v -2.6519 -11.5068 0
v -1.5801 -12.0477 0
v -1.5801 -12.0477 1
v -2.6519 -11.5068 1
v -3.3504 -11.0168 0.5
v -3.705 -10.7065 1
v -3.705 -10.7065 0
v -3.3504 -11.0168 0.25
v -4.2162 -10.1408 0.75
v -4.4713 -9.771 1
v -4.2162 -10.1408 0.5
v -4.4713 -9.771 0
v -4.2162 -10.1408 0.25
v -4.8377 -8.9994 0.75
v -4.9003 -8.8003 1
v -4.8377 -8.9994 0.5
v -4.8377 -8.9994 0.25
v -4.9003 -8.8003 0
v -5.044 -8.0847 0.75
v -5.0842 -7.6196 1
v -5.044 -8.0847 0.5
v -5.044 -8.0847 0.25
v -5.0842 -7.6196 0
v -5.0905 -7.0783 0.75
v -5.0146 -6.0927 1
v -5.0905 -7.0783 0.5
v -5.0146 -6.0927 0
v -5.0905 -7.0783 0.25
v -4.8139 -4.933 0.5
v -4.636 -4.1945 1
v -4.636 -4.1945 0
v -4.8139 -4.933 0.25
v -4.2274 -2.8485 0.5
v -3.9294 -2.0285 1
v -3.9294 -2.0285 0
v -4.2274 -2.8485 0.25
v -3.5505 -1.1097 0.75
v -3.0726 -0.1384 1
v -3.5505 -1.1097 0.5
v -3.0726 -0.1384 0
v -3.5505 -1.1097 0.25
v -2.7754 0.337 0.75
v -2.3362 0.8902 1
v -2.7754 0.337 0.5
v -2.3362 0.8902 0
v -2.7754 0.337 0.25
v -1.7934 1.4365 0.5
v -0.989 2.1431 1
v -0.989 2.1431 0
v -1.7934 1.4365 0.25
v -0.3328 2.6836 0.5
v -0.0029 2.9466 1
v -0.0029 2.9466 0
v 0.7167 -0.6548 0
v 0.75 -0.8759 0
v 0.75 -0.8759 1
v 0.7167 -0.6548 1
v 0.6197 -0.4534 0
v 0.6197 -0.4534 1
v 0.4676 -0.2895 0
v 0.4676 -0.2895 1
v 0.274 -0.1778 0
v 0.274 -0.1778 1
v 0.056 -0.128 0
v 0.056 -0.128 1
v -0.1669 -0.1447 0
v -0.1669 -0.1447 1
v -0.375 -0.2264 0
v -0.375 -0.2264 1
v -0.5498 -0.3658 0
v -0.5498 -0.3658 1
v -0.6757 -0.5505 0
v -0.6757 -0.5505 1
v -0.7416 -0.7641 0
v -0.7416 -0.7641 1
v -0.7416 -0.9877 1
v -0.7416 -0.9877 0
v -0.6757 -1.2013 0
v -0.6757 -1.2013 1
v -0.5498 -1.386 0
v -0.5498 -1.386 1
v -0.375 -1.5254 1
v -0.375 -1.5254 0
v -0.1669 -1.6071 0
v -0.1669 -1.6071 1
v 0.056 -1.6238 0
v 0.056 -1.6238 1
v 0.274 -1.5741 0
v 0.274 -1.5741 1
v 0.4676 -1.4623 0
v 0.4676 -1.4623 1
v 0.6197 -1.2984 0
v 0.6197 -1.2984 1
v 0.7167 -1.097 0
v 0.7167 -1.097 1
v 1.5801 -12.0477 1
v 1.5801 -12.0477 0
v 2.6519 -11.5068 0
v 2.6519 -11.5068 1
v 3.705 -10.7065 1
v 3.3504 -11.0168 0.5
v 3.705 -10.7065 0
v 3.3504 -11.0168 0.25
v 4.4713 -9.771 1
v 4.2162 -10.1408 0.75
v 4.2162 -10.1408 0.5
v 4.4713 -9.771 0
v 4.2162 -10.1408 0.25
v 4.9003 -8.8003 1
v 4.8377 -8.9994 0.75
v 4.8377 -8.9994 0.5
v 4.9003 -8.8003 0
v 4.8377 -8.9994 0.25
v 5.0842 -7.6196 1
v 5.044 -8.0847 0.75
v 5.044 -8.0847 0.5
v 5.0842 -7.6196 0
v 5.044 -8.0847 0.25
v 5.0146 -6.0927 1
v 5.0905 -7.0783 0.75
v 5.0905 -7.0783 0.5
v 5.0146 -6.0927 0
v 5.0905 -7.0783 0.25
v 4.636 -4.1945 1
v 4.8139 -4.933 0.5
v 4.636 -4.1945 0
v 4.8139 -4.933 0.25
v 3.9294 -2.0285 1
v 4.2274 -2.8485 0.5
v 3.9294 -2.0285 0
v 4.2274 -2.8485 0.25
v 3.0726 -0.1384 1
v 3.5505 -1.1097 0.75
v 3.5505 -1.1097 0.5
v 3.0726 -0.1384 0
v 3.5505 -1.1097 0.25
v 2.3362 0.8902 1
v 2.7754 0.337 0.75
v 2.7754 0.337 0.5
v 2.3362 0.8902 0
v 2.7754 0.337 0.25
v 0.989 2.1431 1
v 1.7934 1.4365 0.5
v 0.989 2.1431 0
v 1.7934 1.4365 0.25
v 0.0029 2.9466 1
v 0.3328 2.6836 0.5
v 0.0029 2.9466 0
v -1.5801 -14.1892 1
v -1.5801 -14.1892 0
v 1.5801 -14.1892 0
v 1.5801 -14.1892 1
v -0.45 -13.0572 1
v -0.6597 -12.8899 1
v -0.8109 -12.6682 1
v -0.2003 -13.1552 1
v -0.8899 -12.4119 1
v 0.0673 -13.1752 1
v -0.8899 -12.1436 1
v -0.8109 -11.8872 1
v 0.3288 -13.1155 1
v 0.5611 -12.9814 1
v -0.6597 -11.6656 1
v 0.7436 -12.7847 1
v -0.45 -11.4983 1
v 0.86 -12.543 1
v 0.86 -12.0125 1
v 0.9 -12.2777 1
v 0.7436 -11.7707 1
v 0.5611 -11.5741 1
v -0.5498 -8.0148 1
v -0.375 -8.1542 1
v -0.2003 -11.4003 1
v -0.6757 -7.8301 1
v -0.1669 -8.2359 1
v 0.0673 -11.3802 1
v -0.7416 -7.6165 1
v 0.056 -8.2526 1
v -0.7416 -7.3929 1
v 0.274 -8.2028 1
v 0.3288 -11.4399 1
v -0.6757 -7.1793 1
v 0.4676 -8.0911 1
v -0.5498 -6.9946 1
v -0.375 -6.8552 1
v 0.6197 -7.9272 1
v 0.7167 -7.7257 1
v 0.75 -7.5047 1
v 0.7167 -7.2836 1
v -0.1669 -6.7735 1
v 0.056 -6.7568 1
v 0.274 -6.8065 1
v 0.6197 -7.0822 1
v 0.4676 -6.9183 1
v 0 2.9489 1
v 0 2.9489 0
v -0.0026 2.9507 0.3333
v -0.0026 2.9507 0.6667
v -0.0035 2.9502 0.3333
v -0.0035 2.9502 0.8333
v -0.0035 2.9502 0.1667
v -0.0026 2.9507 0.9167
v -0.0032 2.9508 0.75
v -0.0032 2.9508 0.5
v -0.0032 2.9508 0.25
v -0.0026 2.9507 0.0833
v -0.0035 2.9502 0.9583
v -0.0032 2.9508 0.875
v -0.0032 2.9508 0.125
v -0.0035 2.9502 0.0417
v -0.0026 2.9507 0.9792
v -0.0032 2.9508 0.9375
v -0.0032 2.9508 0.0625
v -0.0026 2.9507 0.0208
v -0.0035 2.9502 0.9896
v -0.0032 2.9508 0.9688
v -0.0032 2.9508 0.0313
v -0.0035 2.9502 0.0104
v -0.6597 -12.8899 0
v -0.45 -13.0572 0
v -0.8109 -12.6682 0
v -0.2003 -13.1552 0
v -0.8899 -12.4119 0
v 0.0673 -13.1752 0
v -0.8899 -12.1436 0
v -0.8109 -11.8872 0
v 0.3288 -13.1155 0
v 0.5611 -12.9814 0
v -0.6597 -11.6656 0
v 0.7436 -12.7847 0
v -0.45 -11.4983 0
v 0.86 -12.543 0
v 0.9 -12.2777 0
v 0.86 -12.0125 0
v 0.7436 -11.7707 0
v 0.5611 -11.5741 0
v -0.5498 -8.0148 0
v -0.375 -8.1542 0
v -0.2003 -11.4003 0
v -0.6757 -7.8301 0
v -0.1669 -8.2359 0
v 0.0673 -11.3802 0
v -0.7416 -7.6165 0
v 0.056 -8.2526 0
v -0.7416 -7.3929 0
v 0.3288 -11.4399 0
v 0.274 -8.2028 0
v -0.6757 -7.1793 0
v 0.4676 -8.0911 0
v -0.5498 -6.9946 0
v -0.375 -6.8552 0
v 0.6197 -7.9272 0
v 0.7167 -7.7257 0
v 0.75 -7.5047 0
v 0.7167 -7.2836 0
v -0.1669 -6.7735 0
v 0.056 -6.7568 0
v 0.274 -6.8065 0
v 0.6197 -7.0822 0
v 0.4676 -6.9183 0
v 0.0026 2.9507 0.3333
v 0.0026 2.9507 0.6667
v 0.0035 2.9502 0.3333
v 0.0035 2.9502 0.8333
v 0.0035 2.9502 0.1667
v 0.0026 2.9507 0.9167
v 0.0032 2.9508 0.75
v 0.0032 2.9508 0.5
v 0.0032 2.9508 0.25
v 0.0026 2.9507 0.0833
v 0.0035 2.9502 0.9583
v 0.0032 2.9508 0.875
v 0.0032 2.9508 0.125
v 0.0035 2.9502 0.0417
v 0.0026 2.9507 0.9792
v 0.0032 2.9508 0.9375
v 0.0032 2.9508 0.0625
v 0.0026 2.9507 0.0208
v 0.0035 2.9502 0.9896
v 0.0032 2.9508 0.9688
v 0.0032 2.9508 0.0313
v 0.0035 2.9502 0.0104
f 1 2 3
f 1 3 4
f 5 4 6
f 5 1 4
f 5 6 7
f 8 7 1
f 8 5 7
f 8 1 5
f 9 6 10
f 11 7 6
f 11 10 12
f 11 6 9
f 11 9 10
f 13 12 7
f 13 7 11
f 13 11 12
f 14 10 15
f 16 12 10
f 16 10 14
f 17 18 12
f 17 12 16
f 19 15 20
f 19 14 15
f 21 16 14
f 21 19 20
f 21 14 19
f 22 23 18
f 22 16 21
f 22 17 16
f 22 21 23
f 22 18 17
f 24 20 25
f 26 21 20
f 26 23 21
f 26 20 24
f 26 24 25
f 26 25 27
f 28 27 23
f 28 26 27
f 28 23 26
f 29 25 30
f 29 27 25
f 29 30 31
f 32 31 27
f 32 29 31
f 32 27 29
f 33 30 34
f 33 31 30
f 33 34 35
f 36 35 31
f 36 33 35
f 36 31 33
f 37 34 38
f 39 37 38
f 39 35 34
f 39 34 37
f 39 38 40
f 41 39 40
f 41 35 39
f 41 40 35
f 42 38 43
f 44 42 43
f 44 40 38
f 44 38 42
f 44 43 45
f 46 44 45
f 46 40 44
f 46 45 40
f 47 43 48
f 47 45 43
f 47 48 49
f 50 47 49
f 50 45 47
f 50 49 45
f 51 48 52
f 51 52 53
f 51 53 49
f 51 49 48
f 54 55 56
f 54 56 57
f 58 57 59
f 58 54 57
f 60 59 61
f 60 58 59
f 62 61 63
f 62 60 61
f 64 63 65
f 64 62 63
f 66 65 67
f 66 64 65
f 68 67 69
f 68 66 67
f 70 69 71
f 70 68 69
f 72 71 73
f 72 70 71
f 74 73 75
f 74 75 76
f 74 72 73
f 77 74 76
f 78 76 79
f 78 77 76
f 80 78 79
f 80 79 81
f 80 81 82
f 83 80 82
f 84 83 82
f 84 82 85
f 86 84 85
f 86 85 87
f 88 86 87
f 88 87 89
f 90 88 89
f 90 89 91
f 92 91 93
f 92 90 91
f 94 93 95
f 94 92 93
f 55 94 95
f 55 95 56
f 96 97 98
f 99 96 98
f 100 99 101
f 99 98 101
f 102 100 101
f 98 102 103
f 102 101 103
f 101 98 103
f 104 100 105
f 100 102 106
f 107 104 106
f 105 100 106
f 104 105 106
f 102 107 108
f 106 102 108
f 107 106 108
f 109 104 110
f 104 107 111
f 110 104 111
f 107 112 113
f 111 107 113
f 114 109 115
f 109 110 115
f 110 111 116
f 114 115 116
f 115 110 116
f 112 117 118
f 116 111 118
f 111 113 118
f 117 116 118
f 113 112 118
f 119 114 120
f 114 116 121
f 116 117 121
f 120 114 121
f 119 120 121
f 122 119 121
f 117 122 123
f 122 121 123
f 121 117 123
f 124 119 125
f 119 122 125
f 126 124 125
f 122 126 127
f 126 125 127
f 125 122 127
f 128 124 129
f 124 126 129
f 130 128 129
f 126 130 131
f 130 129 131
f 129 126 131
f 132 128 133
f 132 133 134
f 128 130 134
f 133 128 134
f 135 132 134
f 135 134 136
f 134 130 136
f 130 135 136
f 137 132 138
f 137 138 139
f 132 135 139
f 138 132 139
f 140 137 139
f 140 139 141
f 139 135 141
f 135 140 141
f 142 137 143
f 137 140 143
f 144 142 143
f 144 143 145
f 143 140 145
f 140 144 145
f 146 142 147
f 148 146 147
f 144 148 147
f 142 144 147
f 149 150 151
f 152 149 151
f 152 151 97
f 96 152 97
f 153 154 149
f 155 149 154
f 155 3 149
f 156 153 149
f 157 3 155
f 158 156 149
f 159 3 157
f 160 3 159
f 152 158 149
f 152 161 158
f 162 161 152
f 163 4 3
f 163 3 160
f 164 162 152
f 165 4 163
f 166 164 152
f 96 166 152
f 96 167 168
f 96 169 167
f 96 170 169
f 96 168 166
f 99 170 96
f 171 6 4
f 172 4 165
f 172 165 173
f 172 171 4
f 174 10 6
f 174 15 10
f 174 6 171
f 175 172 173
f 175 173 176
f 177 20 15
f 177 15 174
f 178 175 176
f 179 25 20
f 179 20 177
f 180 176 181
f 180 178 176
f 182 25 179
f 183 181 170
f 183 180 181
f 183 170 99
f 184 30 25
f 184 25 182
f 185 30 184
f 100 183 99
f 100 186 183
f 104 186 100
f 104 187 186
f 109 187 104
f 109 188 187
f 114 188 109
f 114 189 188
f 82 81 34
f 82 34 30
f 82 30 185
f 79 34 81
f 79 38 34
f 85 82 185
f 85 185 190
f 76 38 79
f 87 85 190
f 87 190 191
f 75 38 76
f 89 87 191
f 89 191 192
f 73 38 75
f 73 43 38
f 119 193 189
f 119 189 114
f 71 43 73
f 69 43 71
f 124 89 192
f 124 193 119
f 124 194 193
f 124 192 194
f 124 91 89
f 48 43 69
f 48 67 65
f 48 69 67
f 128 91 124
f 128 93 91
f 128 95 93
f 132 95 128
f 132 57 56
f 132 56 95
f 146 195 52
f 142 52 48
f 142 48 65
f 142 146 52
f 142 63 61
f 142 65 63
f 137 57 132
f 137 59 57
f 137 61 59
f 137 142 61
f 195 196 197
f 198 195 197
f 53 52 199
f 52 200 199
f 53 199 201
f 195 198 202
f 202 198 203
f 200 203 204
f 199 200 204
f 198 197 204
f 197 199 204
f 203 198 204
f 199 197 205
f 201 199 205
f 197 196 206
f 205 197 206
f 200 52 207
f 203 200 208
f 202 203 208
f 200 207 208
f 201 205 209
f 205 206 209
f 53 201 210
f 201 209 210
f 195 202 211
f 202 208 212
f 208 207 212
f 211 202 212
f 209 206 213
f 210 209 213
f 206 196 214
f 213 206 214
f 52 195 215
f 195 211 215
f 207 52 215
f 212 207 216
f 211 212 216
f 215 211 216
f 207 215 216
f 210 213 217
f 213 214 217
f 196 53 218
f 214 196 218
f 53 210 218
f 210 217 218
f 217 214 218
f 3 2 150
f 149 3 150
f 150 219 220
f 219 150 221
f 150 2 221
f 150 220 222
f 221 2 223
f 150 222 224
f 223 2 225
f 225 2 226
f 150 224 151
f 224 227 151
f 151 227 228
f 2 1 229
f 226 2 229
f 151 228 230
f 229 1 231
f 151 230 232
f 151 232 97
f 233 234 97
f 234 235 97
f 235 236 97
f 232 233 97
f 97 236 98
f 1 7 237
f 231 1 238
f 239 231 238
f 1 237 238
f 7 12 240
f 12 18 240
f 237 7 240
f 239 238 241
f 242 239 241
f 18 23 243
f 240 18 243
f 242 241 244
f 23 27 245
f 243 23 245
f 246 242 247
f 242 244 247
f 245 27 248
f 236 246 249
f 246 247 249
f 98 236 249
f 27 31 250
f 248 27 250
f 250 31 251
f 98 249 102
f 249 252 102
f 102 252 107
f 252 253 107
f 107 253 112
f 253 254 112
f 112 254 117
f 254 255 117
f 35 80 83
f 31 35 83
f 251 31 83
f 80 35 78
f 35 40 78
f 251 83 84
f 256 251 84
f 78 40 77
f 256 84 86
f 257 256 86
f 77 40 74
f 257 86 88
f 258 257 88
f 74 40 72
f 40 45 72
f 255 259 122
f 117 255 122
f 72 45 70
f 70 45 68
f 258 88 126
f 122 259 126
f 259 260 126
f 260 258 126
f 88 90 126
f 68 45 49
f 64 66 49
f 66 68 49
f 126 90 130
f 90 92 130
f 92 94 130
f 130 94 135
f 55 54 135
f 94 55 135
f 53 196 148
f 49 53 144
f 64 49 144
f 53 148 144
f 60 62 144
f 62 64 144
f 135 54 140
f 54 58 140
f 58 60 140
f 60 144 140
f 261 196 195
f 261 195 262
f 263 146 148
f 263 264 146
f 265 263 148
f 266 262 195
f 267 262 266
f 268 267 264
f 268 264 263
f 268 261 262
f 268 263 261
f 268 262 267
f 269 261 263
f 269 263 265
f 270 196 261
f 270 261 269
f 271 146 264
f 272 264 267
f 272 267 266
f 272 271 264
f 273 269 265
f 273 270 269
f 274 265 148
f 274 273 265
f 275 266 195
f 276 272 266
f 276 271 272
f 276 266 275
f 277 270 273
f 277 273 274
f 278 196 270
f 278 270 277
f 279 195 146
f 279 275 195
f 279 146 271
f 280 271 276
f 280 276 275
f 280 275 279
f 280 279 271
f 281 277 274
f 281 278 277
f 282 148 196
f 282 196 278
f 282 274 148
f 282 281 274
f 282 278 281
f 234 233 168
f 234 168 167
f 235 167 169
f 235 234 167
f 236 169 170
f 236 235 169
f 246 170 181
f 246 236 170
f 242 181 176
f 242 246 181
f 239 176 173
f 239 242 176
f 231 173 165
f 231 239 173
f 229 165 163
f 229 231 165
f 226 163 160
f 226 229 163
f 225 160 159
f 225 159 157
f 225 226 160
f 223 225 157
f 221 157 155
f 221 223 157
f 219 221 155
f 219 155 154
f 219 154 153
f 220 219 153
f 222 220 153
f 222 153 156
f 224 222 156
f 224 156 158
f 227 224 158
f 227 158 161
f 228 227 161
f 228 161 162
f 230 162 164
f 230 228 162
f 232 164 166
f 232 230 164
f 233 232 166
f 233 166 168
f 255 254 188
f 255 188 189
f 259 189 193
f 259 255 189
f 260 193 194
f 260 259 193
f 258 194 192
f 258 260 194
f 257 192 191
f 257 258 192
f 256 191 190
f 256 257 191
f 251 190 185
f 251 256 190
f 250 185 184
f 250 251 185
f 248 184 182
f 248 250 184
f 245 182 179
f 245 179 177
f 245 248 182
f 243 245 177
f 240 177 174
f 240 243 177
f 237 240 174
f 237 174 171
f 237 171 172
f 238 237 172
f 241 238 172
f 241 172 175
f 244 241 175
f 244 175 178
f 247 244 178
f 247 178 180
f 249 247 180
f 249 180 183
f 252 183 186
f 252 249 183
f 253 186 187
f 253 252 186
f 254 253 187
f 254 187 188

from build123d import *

# Parameters (mm, degrees)
F0_R     = 0.9
F0_R_2   = 0.75
F1_DEPTH = 1


with BuildPart() as f1:
    # F0 (on Top) → F1 (new body)
    with BuildSketch(Plane.XY):
        with BuildLine():
            Line((-1.5801185972, -14.1891559951), (0, -14.1891559951))
            Line((0, -14.1891559951), (1.5801185972, -14.1891559951))
            Line((1.5801185972, -14.1891559951), (1.5801185972, -12.0477042827))
            add(Edge.make_bspline(
                [(1.5801185972, -12.0477042827), (2.5459541843, -11.6559293479), (6.5291377224, -9.4358668754), (3.6630530699, -0.8044320957), (2.2592520144, 1.1687912571), (0.090530272, 2.877961005), (0.002861701, 2.946611466)],
                knots=[0, 0, 0, 0, 0.2531546654, 0.5920262082, 0.802833891, 0.9841362798, 0.9841362798, 0.9841362798, 0.9841362798], degree=3))
            add(Edge.make_bspline(
                [(0.002861701, 2.946611466), (0.0022873137, 2.9442752228), (0.0013231593, 2.9408383042), (0, 2.9359889357)],
                knots=[0.9959578645, 0.9959578645, 0.9959578645, 0.9959578645, 1, 1, 1, 1], degree=3))
            add(Edge.make_bspline(
                [(-0.002861701, 2.946611466), (-0.0022873137, 2.9442752228), (-0.0013231593, 2.9408383042), (0, 2.9359889357)],
                knots=[0.9959578645, 0.9959578645, 0.9959578645, 0.9959578645, 1, 1, 1, 1], degree=3))
            add(Edge.make_bspline(
                [(-1.5801185972, -12.0477042827), (-2.5459541843, -11.6559293479), (-6.5291377224, -9.4358668754), (-3.6630530699, -0.8044320957), (-2.2592520144, 1.1687912571), (-0.090530272, 2.877961005), (-0.002861701, 2.946611466)],
                knots=[0, 0, 0, 0, 0.2531546654, 0.5920262082, 0.802833891, 0.9841362798, 0.9841362798, 0.9841362798, 0.9841362798], degree=3))
            Line((-1.5801185972, -12.0477042827), (-1.5801185972, -14.1891559951))
        make_face()
        with Locations((0, -12.2777316719)):
            Circle(F0_R, mode=Mode.SUBTRACT)
        with Locations((0, -7.5046815909)):
            Circle(F0_R_2, mode=Mode.SUBTRACT)
        with Locations((0, -0.8759110351)):
            Circle(F0_R_2, mode=Mode.SUBTRACT)
        with BuildLine():
            add(Edge.make_bspline(
                [(0.002861701, 2.946611466), (0.0022873137, 2.9442752228), (0.0013231593, 2.9408383042), (0, 2.9359889357)],
                knots=[0.9959578645, 0.9959578645, 0.9959578645, 0.9959578645, 1, 1, 1, 1], degree=3))
            add(Edge.make_bspline(
                [(0.002861701, 2.946611466), (0.0017633731, 2.9474715315), (0.0008086746, 2.9482183335), (0, 2.9488501794)],
                knots=[0.9841362798, 0.9841362798, 0.9841362798, 0.9841362798, 0.9864076693, 0.9864076693, 0.9864076693, 0.9864076693], degree=3))
            add(Edge.make_bspline(
                [(-0.002861701, 2.946611466), (-0.0017633731, 2.9474715315), (-0.0008086746, 2.9482183335), (0, 2.9488501794)],
                knots=[0.9841362798, 0.9841362798, 0.9841362798, 0.9841362798, 0.9864076693, 0.9864076693, 0.9864076693, 0.9864076693], degree=3))
            add(Edge.make_bspline(
                [(-0.002861701, 2.946611466), (-0.0022873137, 2.9442752228), (-0.0013231593, 2.9408383042), (0, 2.9359889357)],
                knots=[0.9959578645, 0.9959578645, 0.9959578645, 0.9959578645, 1, 1, 1, 1], degree=3))
        make_face()
        with BuildLine():
            add(Edge.make_bspline(
                [(0.002861701, 2.946611466), (0.0017633731, 2.9474715315), (0.0008086746, 2.9482183335), (0, 2.9488501794)],
                knots=[0.9841362798, 0.9841362798, 0.9841362798, 0.9841362798, 0.9864076693, 0.9864076693, 0.9864076693, 0.9864076693], degree=3))
            add(Edge.make_bspline(
                [(0, 2.9488501794), (0.0034001215, 2.9515068139), (0.0042187835, 2.9521312164), (0.002861701, 2.946611466)],
                knots=[0.9864076693, 0.9864076693, 0.9864076693, 0.9864076693, 0.9959578645, 0.9959578645, 0.9959578645, 0.9959578645], degree=3))
        make_face()
        with BuildLine():
            add(Edge.make_bspline(
                [(0, 2.9488501794), (-0.0034001215, 2.9515068139), (-0.0042187835, 2.9521312164), (-0.002861701, 2.946611466)],
                knots=[0.9864076693, 0.9864076693, 0.9864076693, 0.9864076693, 0.9959578645, 0.9959578645, 0.9959578645, 0.9959578645], degree=3))
            add(Edge.make_bspline(
                [(-0.002861701, 2.946611466), (-0.0017633731, 2.9474715315), (-0.0008086746, 2.9482183335), (0, 2.9488501794)],
                knots=[0.9841362798, 0.9841362798, 0.9841362798, 0.9841362798, 0.9864076693, 0.9864076693, 0.9864076693, 0.9864076693], degree=3))
        make_face()
    extrude(amount=F1_DEPTH)


solid = f1.part
